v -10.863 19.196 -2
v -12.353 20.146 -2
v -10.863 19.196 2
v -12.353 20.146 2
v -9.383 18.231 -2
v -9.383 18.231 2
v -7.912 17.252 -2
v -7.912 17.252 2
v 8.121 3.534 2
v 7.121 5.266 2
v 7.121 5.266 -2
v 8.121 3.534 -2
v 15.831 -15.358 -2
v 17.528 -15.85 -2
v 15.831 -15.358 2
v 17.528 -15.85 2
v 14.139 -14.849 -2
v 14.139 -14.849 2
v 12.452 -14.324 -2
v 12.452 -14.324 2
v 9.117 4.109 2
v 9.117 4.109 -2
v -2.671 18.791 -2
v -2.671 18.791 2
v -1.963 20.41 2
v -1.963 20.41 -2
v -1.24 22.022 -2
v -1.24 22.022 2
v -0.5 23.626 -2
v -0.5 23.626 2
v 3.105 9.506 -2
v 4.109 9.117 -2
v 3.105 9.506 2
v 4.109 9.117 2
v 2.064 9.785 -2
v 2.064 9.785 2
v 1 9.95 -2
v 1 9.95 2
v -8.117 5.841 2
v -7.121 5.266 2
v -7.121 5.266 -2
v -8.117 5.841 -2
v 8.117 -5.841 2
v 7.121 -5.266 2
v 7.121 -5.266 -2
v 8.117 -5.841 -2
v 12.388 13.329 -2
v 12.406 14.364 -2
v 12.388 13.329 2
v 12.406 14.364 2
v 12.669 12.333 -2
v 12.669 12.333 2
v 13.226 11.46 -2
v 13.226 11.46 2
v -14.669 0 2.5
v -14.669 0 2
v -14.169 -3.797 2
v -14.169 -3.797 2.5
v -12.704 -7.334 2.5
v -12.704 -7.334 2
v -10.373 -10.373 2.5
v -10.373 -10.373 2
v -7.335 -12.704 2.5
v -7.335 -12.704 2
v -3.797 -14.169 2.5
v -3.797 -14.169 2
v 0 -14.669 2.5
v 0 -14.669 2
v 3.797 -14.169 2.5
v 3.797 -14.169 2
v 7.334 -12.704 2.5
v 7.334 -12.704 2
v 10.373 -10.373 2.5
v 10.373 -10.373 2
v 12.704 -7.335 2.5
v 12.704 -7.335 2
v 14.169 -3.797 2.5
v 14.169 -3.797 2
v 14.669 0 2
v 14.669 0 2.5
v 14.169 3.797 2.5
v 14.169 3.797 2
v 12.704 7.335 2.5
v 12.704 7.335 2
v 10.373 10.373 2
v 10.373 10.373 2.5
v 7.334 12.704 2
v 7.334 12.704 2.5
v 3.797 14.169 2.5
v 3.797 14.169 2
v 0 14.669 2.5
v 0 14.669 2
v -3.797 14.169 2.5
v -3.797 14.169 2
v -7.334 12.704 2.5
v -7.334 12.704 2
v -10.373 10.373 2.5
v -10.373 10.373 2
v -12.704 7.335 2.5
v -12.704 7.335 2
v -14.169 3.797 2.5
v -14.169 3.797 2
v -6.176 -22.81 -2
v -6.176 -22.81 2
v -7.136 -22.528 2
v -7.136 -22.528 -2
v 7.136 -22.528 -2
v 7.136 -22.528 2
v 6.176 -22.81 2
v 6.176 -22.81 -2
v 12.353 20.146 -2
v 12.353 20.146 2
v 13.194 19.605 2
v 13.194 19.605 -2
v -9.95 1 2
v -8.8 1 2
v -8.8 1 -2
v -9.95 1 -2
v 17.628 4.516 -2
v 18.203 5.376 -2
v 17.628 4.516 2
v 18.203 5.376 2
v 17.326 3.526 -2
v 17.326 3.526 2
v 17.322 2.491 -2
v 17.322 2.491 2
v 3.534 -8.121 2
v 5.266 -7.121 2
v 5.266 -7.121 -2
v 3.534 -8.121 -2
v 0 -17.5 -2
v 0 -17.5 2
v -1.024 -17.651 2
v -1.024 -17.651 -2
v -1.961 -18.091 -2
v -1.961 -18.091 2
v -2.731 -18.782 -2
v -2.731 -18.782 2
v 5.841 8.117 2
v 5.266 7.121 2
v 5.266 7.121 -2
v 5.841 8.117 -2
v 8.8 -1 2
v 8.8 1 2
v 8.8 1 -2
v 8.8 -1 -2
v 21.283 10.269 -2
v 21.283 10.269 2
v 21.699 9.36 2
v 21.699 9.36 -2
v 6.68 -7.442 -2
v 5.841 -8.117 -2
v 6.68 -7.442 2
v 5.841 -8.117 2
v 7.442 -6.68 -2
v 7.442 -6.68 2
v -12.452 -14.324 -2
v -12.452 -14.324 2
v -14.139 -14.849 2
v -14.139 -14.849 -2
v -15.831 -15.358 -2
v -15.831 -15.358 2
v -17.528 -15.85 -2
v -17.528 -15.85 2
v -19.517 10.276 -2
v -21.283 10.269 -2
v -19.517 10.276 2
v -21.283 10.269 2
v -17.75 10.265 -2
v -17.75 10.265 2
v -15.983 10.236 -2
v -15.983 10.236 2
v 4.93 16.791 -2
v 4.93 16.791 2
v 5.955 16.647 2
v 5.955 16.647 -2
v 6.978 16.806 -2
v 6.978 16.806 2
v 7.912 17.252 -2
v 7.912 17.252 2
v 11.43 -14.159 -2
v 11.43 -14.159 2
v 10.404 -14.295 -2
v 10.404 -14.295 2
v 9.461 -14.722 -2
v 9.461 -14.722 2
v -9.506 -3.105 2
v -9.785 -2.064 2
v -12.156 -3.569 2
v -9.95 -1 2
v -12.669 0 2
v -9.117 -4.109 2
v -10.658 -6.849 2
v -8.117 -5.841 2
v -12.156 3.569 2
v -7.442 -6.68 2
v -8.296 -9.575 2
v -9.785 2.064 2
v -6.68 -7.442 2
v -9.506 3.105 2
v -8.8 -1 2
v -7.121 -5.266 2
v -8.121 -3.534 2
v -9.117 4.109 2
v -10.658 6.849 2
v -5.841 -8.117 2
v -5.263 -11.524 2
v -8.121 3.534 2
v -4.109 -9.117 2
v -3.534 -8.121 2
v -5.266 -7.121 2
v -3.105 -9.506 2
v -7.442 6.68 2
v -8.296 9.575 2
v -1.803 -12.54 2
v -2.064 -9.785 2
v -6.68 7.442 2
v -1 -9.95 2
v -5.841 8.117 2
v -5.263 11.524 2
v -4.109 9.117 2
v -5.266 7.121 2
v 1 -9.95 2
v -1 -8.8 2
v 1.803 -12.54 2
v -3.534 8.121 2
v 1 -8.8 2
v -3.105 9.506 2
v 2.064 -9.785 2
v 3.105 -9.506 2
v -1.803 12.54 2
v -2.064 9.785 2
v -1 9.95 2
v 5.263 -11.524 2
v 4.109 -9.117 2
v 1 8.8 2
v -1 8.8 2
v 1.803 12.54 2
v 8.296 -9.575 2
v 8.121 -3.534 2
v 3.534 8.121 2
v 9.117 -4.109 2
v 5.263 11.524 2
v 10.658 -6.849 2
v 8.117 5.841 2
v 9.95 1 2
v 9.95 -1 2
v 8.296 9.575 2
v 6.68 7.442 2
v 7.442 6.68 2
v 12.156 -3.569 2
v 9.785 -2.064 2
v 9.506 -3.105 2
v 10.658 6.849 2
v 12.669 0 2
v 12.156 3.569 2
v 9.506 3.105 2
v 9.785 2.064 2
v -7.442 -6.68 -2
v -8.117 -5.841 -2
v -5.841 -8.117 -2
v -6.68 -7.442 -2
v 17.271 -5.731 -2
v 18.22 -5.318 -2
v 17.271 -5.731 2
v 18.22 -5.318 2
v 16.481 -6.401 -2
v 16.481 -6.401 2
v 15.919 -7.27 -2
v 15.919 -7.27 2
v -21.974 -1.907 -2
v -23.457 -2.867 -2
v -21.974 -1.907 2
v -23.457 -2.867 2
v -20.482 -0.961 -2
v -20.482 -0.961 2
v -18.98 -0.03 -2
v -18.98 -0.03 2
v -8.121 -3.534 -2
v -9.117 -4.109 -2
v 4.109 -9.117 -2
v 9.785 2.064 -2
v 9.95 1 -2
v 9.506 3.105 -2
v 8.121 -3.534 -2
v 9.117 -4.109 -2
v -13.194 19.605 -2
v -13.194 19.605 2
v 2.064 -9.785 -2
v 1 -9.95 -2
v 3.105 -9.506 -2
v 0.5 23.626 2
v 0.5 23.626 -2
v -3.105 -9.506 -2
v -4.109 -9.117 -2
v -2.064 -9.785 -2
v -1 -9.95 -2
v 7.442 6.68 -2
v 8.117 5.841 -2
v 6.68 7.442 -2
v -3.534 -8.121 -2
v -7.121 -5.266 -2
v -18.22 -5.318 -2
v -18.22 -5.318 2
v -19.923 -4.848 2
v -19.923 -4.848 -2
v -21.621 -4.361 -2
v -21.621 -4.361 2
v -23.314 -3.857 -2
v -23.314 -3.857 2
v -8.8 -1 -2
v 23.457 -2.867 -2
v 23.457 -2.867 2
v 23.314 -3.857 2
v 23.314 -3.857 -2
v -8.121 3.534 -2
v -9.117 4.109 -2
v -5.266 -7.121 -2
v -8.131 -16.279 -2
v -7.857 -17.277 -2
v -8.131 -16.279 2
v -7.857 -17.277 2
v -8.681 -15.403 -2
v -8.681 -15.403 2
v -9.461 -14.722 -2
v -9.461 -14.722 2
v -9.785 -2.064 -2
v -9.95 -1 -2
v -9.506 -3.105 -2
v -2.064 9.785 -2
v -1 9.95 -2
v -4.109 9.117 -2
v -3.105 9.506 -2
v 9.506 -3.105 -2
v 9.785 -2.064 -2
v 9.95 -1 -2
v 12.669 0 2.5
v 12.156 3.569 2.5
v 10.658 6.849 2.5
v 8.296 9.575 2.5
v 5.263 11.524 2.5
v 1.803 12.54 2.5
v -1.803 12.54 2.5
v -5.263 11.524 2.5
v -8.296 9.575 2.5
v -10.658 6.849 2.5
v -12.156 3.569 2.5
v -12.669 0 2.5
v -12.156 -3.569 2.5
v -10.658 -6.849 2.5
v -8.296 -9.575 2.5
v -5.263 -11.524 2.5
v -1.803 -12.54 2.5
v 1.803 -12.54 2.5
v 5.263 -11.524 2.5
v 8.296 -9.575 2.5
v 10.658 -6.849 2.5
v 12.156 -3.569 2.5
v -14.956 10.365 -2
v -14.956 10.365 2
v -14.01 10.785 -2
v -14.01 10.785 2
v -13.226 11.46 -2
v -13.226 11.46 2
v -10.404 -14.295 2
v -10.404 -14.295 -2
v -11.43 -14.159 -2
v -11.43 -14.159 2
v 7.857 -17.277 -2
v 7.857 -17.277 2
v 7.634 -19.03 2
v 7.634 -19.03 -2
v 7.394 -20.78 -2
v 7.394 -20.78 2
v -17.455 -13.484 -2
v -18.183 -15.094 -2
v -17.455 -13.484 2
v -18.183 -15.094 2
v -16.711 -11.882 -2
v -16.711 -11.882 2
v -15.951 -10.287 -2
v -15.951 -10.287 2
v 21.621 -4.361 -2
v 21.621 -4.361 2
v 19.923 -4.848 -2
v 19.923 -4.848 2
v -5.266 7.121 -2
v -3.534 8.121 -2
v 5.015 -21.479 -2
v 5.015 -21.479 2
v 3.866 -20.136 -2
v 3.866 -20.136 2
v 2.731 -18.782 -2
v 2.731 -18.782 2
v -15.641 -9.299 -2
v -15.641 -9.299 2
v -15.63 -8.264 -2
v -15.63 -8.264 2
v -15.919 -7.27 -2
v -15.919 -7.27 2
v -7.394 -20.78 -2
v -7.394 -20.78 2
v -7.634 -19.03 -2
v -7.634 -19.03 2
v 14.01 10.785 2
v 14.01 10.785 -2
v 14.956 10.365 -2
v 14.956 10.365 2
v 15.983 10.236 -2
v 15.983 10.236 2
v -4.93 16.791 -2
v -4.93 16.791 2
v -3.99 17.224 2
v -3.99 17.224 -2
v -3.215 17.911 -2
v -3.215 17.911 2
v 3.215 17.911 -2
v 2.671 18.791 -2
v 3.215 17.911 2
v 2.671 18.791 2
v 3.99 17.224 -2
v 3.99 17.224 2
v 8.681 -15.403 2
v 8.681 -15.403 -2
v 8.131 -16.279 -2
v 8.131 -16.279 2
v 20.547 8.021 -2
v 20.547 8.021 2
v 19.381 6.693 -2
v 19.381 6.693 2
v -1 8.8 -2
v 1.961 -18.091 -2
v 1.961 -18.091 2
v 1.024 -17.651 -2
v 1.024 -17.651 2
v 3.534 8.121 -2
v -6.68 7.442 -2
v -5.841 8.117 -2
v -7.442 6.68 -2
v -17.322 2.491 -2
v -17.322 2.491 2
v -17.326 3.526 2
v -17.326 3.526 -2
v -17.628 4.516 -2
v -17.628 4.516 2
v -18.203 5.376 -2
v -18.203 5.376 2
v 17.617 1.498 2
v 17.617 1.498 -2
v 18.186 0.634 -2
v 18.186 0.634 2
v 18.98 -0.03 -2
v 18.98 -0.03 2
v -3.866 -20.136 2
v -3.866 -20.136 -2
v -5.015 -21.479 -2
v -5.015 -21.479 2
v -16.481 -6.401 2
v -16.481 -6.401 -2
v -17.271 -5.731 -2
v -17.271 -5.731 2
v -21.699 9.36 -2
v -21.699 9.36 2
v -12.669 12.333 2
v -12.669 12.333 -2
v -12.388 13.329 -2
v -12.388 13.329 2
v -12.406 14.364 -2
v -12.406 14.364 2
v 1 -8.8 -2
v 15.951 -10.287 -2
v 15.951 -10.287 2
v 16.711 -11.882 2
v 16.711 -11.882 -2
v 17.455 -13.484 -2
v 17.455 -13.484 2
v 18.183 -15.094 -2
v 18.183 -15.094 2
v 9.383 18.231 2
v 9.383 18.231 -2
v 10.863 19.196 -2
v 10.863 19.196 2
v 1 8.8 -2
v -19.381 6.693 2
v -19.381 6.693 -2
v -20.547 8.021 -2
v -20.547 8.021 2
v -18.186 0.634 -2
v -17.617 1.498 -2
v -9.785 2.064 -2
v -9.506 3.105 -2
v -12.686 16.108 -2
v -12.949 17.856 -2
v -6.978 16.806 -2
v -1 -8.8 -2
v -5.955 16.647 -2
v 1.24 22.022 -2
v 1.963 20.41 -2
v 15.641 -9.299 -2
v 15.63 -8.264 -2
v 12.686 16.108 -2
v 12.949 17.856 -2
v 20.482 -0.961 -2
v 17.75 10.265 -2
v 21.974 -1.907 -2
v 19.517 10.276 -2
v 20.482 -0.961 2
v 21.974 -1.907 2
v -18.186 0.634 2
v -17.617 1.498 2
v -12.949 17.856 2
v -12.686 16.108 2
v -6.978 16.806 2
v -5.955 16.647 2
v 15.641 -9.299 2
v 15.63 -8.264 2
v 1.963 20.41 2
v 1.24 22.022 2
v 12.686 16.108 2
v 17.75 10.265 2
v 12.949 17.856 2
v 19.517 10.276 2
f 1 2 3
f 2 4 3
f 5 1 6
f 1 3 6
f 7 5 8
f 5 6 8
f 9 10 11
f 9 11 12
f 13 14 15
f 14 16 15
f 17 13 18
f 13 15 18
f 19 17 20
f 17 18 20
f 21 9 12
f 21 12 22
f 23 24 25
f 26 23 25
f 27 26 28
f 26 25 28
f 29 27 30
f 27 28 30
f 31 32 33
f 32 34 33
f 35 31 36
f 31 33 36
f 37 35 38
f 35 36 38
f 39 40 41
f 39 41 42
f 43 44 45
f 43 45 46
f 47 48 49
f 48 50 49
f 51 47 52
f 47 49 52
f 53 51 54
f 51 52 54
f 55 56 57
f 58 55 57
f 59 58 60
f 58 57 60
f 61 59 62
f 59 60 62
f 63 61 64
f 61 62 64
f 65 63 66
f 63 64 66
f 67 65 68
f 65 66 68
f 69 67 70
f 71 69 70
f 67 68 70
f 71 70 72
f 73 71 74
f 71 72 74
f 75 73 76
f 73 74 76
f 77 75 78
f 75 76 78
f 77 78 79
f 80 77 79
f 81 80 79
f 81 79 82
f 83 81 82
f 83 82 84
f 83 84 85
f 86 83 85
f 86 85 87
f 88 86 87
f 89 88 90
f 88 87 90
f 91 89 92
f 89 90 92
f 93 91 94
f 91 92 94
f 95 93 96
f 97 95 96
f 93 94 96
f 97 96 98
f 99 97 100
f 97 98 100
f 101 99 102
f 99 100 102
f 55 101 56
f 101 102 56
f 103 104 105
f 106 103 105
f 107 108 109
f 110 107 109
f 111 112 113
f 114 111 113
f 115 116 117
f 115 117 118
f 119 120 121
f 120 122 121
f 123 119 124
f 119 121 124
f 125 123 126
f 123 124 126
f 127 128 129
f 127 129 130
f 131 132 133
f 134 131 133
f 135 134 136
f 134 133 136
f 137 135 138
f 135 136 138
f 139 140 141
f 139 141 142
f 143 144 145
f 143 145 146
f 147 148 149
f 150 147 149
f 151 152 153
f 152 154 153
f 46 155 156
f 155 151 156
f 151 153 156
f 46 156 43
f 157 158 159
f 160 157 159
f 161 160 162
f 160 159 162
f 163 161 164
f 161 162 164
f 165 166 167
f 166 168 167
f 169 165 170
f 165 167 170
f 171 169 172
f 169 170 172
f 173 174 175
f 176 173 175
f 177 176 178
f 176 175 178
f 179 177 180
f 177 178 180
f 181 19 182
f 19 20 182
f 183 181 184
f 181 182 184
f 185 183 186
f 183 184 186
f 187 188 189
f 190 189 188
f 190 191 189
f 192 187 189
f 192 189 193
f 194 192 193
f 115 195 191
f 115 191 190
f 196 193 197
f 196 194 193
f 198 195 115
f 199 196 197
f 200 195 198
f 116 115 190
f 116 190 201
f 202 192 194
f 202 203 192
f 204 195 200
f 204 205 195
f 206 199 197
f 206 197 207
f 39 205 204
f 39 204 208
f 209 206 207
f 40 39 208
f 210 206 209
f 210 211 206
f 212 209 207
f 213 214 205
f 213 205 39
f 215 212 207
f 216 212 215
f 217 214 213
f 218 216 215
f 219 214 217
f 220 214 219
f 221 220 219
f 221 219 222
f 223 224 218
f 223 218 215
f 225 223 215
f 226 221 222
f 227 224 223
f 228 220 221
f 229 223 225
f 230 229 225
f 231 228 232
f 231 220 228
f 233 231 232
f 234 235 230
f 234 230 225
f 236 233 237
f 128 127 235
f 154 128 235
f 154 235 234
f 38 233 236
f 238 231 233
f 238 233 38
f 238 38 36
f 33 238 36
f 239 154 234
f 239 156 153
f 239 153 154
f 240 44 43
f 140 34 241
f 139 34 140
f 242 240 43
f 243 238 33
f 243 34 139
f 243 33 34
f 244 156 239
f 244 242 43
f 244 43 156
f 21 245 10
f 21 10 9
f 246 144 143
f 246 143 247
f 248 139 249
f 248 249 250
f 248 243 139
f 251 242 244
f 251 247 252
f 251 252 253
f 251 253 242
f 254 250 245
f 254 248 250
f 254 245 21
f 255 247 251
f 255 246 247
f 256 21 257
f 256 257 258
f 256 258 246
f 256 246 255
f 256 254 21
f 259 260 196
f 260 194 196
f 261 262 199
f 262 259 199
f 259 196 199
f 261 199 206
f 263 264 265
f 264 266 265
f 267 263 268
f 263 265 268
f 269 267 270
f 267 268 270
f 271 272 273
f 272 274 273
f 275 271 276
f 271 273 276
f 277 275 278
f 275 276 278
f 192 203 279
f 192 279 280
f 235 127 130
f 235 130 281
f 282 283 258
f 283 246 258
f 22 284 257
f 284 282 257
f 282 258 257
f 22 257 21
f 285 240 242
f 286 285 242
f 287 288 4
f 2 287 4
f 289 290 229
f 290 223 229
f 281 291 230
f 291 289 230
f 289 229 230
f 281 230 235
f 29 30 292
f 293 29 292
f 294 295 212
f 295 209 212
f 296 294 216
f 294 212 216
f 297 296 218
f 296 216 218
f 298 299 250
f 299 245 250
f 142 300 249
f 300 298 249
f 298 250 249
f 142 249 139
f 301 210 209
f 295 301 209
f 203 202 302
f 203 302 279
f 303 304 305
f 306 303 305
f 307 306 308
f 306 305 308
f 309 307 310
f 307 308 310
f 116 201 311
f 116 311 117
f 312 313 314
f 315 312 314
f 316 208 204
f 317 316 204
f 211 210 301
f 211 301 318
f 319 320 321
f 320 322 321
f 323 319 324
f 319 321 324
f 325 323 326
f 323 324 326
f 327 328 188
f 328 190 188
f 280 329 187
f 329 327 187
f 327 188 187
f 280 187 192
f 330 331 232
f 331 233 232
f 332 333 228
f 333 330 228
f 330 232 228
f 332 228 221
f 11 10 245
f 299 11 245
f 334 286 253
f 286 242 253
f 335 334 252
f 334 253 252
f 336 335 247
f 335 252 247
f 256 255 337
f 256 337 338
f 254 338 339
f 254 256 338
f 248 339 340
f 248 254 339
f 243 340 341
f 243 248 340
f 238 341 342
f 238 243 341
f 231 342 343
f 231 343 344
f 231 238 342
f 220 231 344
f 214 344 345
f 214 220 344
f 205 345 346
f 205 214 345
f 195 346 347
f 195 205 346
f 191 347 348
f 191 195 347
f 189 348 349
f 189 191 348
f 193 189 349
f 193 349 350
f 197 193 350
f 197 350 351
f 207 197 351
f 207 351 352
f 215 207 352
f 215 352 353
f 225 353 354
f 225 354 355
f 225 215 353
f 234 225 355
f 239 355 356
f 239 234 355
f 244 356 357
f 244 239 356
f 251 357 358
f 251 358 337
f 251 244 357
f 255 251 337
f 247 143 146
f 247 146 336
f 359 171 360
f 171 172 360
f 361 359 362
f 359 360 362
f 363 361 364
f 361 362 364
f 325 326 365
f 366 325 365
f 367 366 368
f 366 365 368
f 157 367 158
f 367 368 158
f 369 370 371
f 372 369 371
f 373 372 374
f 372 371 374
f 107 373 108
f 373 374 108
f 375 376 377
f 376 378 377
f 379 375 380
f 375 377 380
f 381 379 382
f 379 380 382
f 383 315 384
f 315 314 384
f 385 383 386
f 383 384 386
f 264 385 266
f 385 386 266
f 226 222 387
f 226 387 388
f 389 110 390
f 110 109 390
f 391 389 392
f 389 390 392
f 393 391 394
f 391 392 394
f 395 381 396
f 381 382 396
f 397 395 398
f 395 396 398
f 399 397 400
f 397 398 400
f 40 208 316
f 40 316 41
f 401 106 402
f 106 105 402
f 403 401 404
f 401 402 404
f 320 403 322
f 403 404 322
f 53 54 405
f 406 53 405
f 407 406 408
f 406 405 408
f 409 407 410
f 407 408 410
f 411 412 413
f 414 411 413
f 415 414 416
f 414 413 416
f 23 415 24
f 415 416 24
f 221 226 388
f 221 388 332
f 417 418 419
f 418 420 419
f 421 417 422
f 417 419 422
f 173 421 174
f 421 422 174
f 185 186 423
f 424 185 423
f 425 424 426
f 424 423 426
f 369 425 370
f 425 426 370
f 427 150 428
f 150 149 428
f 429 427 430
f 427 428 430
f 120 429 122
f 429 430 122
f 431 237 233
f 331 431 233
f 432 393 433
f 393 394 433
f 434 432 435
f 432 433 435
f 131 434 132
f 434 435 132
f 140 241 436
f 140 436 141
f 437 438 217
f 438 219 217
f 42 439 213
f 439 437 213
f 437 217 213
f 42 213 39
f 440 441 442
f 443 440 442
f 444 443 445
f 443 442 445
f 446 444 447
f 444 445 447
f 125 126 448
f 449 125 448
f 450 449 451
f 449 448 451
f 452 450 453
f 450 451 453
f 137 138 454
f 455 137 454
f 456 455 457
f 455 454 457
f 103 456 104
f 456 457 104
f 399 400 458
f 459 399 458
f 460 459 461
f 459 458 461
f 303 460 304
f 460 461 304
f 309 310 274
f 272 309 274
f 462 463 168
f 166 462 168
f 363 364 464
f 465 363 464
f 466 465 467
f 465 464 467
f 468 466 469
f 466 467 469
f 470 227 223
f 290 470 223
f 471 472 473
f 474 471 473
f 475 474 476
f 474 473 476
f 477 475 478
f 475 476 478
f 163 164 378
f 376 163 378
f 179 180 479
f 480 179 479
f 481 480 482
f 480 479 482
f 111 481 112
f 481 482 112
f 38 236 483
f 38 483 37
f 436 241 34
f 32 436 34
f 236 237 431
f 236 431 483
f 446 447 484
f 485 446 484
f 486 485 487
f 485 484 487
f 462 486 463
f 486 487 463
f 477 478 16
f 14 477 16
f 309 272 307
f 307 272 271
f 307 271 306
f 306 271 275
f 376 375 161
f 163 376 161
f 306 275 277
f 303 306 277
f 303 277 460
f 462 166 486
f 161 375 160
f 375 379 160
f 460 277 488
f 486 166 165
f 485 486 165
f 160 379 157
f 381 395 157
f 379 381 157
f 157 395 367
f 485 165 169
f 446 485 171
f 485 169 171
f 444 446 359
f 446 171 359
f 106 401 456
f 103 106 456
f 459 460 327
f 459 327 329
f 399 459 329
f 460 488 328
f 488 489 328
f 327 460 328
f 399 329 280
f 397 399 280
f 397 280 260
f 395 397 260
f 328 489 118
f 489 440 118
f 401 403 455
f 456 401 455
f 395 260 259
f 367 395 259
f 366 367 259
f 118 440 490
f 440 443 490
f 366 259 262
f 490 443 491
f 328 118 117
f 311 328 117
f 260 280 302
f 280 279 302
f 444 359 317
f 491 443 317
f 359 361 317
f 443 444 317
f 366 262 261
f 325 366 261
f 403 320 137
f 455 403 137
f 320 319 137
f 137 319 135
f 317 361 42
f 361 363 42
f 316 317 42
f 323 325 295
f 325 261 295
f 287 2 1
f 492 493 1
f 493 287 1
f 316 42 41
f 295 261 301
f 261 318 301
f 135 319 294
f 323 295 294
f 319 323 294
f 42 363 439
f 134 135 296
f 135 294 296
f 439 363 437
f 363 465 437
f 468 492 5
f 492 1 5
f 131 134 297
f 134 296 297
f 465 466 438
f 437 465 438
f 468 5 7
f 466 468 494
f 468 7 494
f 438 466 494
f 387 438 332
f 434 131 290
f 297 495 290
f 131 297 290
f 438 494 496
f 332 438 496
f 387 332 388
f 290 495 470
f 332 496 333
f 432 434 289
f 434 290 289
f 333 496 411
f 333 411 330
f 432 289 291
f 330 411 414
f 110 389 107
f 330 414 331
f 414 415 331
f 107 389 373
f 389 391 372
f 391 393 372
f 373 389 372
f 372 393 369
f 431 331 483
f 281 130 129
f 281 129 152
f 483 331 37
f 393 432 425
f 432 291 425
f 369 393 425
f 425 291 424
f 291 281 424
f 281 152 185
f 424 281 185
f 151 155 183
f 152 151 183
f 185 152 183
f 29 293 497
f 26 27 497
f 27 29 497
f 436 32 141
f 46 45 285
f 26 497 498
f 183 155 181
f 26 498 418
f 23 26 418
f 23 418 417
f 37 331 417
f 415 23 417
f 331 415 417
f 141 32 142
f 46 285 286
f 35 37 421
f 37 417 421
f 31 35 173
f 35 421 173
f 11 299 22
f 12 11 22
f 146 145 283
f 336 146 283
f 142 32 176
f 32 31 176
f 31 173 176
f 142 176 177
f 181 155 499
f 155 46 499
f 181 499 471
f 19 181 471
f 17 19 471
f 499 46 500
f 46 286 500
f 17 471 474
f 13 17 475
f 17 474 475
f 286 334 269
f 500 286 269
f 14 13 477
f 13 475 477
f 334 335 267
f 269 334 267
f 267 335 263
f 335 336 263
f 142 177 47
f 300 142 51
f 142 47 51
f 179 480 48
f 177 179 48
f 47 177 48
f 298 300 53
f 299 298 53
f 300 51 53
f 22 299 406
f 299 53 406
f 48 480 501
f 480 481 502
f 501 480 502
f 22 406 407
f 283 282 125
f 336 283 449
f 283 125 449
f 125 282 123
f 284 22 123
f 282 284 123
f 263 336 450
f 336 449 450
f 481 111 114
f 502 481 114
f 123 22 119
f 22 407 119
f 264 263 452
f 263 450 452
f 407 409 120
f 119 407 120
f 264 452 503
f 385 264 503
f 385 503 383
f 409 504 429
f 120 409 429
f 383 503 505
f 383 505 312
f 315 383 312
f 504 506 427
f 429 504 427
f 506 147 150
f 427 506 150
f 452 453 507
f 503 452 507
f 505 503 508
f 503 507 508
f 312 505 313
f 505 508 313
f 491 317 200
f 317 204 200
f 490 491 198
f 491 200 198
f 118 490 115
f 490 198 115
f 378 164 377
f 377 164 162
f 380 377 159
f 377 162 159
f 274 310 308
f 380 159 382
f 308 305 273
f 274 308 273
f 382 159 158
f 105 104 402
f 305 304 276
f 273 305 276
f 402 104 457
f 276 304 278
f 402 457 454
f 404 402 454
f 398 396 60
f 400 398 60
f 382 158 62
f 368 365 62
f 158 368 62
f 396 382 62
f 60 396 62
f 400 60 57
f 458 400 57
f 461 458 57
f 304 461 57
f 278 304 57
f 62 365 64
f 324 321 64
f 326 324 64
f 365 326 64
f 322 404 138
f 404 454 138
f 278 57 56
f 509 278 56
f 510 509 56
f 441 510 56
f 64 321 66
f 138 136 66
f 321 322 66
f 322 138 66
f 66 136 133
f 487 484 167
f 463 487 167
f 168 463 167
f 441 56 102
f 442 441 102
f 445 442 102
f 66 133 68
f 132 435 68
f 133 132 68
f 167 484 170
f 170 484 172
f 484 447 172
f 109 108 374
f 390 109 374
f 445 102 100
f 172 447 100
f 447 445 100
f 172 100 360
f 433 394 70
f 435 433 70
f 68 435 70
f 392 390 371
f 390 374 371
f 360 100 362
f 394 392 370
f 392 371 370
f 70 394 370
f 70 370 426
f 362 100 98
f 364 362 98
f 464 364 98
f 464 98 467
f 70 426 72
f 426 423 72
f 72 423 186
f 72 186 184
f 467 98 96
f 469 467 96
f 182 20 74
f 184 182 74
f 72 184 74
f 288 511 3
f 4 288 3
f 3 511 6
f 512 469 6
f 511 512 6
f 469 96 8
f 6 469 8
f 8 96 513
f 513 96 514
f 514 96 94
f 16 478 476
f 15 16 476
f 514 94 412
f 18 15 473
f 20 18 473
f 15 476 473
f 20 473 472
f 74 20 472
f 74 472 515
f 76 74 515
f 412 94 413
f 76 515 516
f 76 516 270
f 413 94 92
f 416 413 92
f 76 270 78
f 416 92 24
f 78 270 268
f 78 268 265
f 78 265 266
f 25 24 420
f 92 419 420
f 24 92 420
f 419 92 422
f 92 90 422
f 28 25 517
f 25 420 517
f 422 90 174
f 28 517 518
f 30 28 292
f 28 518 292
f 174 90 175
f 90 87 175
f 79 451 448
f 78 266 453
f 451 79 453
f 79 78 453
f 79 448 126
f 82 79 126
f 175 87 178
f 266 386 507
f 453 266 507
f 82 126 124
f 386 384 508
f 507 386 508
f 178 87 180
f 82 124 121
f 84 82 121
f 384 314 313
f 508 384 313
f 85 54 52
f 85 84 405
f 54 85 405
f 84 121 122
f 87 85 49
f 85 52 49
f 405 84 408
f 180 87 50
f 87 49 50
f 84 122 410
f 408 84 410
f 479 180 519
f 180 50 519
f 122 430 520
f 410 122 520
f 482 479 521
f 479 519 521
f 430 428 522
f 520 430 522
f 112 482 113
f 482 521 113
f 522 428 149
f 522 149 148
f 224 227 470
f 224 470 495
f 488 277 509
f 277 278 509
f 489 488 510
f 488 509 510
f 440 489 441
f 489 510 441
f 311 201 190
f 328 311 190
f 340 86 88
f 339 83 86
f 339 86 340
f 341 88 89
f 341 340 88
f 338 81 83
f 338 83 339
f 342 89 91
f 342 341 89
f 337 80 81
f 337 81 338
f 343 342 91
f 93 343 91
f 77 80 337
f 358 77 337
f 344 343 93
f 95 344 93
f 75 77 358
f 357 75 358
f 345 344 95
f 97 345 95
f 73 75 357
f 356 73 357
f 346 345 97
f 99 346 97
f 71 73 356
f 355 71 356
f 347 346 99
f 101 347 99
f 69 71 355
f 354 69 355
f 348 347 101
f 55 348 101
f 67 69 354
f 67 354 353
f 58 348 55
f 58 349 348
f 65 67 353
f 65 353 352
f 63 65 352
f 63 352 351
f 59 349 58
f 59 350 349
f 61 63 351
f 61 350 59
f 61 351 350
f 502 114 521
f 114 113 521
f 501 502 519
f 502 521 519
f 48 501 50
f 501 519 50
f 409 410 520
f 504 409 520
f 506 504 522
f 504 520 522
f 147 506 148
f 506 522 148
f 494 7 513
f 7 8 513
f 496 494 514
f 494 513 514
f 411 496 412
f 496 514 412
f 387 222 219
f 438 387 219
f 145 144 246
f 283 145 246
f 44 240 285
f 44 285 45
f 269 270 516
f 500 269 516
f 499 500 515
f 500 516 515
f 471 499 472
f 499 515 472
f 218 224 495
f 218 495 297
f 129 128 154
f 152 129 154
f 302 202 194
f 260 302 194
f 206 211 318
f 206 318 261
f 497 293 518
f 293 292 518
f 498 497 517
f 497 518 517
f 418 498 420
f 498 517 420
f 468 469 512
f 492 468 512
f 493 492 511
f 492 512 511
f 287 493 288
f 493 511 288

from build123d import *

# Parameters (mm, degrees)
BOSS_EXTRUDE1_DEPTH      = 2
CIRPATTERN1_COUNT        = 11
BOSS_EXTRUDE2_DEPTH      = 2
BOSS_EXTRUDE2_DEPTH_BACK = 2
SKETCH4_R                = 17.5
SKETCH6_R                = 14.669
SKETCH6_R_2              = 12.669
BOSS_EXTRUDE4_DEPTH      = 0.5
SKETCH7_R                = 10
CUT_EXTRUDE1_DEPTH       = 4
SKETCH8_W                = 2
SKETCH8_H                = 1.2
BOSS_EXTRUDE5_DEPTH      = 4
CIRPATTERN2_COUNT        = 12


with BuildPart() as part:
    # Sketch2 → Boss-Extrude1 (new, symmetric)
    with BuildSketch(Plane.XY):
        with BuildLine():
            Line((-0.5, 23.626113967), (0.5, 23.626113967))
            ThreePointArc((0.5, 23.626113967), (1.603484659, 21.216683922), (2.671054487, 18.791127038))
            ThreePointArc((2.671054487, 18.791127038), (3.577591086, 17.539110484), (4.930319745, 16.791127038))
            ThreePointArc((4.930319745, 16.791127038), (0, 17.5), (-4.930319745, 16.791127038))
            ThreePointArc((-4.930319745, 16.791127038), (-3.577591086, 17.539110484), (-2.671054487, 18.791127038))
            ThreePointArc((-2.671054487, 18.791127038), (-1.603484659, 21.216683922), (-0.5, 23.626113967))
        make_face()
    extrude(amount=BOSS_EXTRUDE1_DEPTH, both=True)


with BuildPart() as cirpattern1_1:
    # CirPattern1: pattern copy
    add(part.part.rotate(Axis((0, 0, 0), (0, 0, 1)), 1 * 360 / CIRPATTERN1_COUNT))


with BuildPart() as cirpattern1_2:
    # CirPattern1: pattern copy
    add(part.part.rotate(Axis((0, 0, 0), (0, 0, 1)), 2 * 360 / CIRPATTERN1_COUNT))


with BuildPart() as cirpattern1_3:
    # CirPattern1: pattern copy
    add(part.part.rotate(Axis((0, 0, 0), (0, 0, 1)), 3 * 360 / CIRPATTERN1_COUNT))


with BuildPart() as cirpattern1_4:
    # CirPattern1: pattern copy
    add(part.part.rotate(Axis((0, 0, 0), (0, 0, 1)), 4 * 360 / CIRPATTERN1_COUNT))


with BuildPart() as cirpattern1_5:
    # CirPattern1: pattern copy
    add(part.part.rotate(Axis((0, 0, 0), (0, 0, 1)), 5 * 360 / CIRPATTERN1_COUNT))


with BuildPart() as cirpattern1_6:
    # CirPattern1: pattern copy
    add(part.part.rotate(Axis((0, 0, 0), (0, 0, 1)), 6 * 360 / CIRPATTERN1_COUNT))


with BuildPart() as cirpattern1_7:
    # CirPattern1: pattern copy
    add(part.part.rotate(Axis((0, 0, 0), (0, 0, 1)), 7 * 360 / CIRPATTERN1_COUNT))


with BuildPart() as cirpattern1_8:
    # CirPattern1: pattern copy
    add(part.part.rotate(Axis((0, 0, 0), (0, 0, 1)), 8 * 360 / CIRPATTERN1_COUNT))


with BuildPart() as cirpattern1_9:
    # CirPattern1: pattern copy
    add(part.part.rotate(Axis((0, 0, 0), (0, 0, 1)), 9 * 360 / CIRPATTERN1_COUNT))


with BuildPart() as cirpattern1_10:
    # CirPattern1: pattern copy
    add(part.part.rotate(Axis((0, 0, 0), (0, 0, 1)), 10 * 360 / CIRPATTERN1_COUNT))


with BuildPart() as part_1:
    add(part.part)

    add(cirpattern1_1.part)  # Boss-Extrude2 merges CirPattern1_1

    add(cirpattern1_2.part)  # Boss-Extrude2 merges CirPattern1_2

    add(cirpattern1_3.part)  # Boss-Extrude2 merges CirPattern1_3

    add(cirpattern1_4.part)  # Boss-Extrude2 merges CirPattern1_4

    add(cirpattern1_5.part)  # Boss-Extrude2 merges CirPattern1_5

    add(cirpattern1_6.part)  # Boss-Extrude2 merges CirPattern1_6

    add(cirpattern1_7.part)  # Boss-Extrude2 merges CirPattern1_7

    add(cirpattern1_8.part)  # Boss-Extrude2 merges CirPattern1_8

    add(cirpattern1_9.part)  # Boss-Extrude2 merges CirPattern1_9

    add(cirpattern1_10.part)  # Boss-Extrude2 merges CirPattern1_10
    # Sketch4 → Boss-Extrude2 (add, two sides: drawn at the far end of the back side and taken through both)
    with BuildSketch(Plane.XY.offset(-BOSS_EXTRUDE2_DEPTH_BACK)):
        Circle(SKETCH4_R)
    extrude(amount=BOSS_EXTRUDE2_DEPTH + BOSS_EXTRUDE2_DEPTH_BACK)

    # Sketch6 → Boss-Extrude4 (add)
    with BuildSketch(Plane.XY.offset(2)):
        with Locations(Location((0, 0, 0), (0, 0, 180))):
            Circle(SKETCH6_R)
        Circle(SKETCH6_R_2, mode=Mode.SUBTRACT)
    extrude(amount=BOSS_EXTRUDE4_DEPTH)

    # Sketch7 → Cut-Extrude1 (cut)
    with BuildSketch(Plane.XY.offset(2)):
        Circle(SKETCH7_R)
    extrude(amount=-CUT_EXTRUDE1_DEPTH, mode=Mode.SUBTRACT)

    # Sketch8 → Boss-Extrude5 (add)
    with BuildSketch(Plane.XY.offset(2)):
        with Locations((0, 9.4)):
            Rectangle(SKETCH8_W, SKETCH8_H)
    boss_extrude5 = extrude(amount=-BOSS_EXTRUDE5_DEPTH)

    # CirPattern2: Boss-Extrude5 ×12 about axis
    cirpattern2_axis = Axis((0, 0, 0), (0, 0, 1))
    for i in range(1, CIRPATTERN2_COUNT):
        add(boss_extrude5.rotate(cirpattern2_axis, i * 360 / CIRPATTERN2_COUNT))


solid = part_1.part
